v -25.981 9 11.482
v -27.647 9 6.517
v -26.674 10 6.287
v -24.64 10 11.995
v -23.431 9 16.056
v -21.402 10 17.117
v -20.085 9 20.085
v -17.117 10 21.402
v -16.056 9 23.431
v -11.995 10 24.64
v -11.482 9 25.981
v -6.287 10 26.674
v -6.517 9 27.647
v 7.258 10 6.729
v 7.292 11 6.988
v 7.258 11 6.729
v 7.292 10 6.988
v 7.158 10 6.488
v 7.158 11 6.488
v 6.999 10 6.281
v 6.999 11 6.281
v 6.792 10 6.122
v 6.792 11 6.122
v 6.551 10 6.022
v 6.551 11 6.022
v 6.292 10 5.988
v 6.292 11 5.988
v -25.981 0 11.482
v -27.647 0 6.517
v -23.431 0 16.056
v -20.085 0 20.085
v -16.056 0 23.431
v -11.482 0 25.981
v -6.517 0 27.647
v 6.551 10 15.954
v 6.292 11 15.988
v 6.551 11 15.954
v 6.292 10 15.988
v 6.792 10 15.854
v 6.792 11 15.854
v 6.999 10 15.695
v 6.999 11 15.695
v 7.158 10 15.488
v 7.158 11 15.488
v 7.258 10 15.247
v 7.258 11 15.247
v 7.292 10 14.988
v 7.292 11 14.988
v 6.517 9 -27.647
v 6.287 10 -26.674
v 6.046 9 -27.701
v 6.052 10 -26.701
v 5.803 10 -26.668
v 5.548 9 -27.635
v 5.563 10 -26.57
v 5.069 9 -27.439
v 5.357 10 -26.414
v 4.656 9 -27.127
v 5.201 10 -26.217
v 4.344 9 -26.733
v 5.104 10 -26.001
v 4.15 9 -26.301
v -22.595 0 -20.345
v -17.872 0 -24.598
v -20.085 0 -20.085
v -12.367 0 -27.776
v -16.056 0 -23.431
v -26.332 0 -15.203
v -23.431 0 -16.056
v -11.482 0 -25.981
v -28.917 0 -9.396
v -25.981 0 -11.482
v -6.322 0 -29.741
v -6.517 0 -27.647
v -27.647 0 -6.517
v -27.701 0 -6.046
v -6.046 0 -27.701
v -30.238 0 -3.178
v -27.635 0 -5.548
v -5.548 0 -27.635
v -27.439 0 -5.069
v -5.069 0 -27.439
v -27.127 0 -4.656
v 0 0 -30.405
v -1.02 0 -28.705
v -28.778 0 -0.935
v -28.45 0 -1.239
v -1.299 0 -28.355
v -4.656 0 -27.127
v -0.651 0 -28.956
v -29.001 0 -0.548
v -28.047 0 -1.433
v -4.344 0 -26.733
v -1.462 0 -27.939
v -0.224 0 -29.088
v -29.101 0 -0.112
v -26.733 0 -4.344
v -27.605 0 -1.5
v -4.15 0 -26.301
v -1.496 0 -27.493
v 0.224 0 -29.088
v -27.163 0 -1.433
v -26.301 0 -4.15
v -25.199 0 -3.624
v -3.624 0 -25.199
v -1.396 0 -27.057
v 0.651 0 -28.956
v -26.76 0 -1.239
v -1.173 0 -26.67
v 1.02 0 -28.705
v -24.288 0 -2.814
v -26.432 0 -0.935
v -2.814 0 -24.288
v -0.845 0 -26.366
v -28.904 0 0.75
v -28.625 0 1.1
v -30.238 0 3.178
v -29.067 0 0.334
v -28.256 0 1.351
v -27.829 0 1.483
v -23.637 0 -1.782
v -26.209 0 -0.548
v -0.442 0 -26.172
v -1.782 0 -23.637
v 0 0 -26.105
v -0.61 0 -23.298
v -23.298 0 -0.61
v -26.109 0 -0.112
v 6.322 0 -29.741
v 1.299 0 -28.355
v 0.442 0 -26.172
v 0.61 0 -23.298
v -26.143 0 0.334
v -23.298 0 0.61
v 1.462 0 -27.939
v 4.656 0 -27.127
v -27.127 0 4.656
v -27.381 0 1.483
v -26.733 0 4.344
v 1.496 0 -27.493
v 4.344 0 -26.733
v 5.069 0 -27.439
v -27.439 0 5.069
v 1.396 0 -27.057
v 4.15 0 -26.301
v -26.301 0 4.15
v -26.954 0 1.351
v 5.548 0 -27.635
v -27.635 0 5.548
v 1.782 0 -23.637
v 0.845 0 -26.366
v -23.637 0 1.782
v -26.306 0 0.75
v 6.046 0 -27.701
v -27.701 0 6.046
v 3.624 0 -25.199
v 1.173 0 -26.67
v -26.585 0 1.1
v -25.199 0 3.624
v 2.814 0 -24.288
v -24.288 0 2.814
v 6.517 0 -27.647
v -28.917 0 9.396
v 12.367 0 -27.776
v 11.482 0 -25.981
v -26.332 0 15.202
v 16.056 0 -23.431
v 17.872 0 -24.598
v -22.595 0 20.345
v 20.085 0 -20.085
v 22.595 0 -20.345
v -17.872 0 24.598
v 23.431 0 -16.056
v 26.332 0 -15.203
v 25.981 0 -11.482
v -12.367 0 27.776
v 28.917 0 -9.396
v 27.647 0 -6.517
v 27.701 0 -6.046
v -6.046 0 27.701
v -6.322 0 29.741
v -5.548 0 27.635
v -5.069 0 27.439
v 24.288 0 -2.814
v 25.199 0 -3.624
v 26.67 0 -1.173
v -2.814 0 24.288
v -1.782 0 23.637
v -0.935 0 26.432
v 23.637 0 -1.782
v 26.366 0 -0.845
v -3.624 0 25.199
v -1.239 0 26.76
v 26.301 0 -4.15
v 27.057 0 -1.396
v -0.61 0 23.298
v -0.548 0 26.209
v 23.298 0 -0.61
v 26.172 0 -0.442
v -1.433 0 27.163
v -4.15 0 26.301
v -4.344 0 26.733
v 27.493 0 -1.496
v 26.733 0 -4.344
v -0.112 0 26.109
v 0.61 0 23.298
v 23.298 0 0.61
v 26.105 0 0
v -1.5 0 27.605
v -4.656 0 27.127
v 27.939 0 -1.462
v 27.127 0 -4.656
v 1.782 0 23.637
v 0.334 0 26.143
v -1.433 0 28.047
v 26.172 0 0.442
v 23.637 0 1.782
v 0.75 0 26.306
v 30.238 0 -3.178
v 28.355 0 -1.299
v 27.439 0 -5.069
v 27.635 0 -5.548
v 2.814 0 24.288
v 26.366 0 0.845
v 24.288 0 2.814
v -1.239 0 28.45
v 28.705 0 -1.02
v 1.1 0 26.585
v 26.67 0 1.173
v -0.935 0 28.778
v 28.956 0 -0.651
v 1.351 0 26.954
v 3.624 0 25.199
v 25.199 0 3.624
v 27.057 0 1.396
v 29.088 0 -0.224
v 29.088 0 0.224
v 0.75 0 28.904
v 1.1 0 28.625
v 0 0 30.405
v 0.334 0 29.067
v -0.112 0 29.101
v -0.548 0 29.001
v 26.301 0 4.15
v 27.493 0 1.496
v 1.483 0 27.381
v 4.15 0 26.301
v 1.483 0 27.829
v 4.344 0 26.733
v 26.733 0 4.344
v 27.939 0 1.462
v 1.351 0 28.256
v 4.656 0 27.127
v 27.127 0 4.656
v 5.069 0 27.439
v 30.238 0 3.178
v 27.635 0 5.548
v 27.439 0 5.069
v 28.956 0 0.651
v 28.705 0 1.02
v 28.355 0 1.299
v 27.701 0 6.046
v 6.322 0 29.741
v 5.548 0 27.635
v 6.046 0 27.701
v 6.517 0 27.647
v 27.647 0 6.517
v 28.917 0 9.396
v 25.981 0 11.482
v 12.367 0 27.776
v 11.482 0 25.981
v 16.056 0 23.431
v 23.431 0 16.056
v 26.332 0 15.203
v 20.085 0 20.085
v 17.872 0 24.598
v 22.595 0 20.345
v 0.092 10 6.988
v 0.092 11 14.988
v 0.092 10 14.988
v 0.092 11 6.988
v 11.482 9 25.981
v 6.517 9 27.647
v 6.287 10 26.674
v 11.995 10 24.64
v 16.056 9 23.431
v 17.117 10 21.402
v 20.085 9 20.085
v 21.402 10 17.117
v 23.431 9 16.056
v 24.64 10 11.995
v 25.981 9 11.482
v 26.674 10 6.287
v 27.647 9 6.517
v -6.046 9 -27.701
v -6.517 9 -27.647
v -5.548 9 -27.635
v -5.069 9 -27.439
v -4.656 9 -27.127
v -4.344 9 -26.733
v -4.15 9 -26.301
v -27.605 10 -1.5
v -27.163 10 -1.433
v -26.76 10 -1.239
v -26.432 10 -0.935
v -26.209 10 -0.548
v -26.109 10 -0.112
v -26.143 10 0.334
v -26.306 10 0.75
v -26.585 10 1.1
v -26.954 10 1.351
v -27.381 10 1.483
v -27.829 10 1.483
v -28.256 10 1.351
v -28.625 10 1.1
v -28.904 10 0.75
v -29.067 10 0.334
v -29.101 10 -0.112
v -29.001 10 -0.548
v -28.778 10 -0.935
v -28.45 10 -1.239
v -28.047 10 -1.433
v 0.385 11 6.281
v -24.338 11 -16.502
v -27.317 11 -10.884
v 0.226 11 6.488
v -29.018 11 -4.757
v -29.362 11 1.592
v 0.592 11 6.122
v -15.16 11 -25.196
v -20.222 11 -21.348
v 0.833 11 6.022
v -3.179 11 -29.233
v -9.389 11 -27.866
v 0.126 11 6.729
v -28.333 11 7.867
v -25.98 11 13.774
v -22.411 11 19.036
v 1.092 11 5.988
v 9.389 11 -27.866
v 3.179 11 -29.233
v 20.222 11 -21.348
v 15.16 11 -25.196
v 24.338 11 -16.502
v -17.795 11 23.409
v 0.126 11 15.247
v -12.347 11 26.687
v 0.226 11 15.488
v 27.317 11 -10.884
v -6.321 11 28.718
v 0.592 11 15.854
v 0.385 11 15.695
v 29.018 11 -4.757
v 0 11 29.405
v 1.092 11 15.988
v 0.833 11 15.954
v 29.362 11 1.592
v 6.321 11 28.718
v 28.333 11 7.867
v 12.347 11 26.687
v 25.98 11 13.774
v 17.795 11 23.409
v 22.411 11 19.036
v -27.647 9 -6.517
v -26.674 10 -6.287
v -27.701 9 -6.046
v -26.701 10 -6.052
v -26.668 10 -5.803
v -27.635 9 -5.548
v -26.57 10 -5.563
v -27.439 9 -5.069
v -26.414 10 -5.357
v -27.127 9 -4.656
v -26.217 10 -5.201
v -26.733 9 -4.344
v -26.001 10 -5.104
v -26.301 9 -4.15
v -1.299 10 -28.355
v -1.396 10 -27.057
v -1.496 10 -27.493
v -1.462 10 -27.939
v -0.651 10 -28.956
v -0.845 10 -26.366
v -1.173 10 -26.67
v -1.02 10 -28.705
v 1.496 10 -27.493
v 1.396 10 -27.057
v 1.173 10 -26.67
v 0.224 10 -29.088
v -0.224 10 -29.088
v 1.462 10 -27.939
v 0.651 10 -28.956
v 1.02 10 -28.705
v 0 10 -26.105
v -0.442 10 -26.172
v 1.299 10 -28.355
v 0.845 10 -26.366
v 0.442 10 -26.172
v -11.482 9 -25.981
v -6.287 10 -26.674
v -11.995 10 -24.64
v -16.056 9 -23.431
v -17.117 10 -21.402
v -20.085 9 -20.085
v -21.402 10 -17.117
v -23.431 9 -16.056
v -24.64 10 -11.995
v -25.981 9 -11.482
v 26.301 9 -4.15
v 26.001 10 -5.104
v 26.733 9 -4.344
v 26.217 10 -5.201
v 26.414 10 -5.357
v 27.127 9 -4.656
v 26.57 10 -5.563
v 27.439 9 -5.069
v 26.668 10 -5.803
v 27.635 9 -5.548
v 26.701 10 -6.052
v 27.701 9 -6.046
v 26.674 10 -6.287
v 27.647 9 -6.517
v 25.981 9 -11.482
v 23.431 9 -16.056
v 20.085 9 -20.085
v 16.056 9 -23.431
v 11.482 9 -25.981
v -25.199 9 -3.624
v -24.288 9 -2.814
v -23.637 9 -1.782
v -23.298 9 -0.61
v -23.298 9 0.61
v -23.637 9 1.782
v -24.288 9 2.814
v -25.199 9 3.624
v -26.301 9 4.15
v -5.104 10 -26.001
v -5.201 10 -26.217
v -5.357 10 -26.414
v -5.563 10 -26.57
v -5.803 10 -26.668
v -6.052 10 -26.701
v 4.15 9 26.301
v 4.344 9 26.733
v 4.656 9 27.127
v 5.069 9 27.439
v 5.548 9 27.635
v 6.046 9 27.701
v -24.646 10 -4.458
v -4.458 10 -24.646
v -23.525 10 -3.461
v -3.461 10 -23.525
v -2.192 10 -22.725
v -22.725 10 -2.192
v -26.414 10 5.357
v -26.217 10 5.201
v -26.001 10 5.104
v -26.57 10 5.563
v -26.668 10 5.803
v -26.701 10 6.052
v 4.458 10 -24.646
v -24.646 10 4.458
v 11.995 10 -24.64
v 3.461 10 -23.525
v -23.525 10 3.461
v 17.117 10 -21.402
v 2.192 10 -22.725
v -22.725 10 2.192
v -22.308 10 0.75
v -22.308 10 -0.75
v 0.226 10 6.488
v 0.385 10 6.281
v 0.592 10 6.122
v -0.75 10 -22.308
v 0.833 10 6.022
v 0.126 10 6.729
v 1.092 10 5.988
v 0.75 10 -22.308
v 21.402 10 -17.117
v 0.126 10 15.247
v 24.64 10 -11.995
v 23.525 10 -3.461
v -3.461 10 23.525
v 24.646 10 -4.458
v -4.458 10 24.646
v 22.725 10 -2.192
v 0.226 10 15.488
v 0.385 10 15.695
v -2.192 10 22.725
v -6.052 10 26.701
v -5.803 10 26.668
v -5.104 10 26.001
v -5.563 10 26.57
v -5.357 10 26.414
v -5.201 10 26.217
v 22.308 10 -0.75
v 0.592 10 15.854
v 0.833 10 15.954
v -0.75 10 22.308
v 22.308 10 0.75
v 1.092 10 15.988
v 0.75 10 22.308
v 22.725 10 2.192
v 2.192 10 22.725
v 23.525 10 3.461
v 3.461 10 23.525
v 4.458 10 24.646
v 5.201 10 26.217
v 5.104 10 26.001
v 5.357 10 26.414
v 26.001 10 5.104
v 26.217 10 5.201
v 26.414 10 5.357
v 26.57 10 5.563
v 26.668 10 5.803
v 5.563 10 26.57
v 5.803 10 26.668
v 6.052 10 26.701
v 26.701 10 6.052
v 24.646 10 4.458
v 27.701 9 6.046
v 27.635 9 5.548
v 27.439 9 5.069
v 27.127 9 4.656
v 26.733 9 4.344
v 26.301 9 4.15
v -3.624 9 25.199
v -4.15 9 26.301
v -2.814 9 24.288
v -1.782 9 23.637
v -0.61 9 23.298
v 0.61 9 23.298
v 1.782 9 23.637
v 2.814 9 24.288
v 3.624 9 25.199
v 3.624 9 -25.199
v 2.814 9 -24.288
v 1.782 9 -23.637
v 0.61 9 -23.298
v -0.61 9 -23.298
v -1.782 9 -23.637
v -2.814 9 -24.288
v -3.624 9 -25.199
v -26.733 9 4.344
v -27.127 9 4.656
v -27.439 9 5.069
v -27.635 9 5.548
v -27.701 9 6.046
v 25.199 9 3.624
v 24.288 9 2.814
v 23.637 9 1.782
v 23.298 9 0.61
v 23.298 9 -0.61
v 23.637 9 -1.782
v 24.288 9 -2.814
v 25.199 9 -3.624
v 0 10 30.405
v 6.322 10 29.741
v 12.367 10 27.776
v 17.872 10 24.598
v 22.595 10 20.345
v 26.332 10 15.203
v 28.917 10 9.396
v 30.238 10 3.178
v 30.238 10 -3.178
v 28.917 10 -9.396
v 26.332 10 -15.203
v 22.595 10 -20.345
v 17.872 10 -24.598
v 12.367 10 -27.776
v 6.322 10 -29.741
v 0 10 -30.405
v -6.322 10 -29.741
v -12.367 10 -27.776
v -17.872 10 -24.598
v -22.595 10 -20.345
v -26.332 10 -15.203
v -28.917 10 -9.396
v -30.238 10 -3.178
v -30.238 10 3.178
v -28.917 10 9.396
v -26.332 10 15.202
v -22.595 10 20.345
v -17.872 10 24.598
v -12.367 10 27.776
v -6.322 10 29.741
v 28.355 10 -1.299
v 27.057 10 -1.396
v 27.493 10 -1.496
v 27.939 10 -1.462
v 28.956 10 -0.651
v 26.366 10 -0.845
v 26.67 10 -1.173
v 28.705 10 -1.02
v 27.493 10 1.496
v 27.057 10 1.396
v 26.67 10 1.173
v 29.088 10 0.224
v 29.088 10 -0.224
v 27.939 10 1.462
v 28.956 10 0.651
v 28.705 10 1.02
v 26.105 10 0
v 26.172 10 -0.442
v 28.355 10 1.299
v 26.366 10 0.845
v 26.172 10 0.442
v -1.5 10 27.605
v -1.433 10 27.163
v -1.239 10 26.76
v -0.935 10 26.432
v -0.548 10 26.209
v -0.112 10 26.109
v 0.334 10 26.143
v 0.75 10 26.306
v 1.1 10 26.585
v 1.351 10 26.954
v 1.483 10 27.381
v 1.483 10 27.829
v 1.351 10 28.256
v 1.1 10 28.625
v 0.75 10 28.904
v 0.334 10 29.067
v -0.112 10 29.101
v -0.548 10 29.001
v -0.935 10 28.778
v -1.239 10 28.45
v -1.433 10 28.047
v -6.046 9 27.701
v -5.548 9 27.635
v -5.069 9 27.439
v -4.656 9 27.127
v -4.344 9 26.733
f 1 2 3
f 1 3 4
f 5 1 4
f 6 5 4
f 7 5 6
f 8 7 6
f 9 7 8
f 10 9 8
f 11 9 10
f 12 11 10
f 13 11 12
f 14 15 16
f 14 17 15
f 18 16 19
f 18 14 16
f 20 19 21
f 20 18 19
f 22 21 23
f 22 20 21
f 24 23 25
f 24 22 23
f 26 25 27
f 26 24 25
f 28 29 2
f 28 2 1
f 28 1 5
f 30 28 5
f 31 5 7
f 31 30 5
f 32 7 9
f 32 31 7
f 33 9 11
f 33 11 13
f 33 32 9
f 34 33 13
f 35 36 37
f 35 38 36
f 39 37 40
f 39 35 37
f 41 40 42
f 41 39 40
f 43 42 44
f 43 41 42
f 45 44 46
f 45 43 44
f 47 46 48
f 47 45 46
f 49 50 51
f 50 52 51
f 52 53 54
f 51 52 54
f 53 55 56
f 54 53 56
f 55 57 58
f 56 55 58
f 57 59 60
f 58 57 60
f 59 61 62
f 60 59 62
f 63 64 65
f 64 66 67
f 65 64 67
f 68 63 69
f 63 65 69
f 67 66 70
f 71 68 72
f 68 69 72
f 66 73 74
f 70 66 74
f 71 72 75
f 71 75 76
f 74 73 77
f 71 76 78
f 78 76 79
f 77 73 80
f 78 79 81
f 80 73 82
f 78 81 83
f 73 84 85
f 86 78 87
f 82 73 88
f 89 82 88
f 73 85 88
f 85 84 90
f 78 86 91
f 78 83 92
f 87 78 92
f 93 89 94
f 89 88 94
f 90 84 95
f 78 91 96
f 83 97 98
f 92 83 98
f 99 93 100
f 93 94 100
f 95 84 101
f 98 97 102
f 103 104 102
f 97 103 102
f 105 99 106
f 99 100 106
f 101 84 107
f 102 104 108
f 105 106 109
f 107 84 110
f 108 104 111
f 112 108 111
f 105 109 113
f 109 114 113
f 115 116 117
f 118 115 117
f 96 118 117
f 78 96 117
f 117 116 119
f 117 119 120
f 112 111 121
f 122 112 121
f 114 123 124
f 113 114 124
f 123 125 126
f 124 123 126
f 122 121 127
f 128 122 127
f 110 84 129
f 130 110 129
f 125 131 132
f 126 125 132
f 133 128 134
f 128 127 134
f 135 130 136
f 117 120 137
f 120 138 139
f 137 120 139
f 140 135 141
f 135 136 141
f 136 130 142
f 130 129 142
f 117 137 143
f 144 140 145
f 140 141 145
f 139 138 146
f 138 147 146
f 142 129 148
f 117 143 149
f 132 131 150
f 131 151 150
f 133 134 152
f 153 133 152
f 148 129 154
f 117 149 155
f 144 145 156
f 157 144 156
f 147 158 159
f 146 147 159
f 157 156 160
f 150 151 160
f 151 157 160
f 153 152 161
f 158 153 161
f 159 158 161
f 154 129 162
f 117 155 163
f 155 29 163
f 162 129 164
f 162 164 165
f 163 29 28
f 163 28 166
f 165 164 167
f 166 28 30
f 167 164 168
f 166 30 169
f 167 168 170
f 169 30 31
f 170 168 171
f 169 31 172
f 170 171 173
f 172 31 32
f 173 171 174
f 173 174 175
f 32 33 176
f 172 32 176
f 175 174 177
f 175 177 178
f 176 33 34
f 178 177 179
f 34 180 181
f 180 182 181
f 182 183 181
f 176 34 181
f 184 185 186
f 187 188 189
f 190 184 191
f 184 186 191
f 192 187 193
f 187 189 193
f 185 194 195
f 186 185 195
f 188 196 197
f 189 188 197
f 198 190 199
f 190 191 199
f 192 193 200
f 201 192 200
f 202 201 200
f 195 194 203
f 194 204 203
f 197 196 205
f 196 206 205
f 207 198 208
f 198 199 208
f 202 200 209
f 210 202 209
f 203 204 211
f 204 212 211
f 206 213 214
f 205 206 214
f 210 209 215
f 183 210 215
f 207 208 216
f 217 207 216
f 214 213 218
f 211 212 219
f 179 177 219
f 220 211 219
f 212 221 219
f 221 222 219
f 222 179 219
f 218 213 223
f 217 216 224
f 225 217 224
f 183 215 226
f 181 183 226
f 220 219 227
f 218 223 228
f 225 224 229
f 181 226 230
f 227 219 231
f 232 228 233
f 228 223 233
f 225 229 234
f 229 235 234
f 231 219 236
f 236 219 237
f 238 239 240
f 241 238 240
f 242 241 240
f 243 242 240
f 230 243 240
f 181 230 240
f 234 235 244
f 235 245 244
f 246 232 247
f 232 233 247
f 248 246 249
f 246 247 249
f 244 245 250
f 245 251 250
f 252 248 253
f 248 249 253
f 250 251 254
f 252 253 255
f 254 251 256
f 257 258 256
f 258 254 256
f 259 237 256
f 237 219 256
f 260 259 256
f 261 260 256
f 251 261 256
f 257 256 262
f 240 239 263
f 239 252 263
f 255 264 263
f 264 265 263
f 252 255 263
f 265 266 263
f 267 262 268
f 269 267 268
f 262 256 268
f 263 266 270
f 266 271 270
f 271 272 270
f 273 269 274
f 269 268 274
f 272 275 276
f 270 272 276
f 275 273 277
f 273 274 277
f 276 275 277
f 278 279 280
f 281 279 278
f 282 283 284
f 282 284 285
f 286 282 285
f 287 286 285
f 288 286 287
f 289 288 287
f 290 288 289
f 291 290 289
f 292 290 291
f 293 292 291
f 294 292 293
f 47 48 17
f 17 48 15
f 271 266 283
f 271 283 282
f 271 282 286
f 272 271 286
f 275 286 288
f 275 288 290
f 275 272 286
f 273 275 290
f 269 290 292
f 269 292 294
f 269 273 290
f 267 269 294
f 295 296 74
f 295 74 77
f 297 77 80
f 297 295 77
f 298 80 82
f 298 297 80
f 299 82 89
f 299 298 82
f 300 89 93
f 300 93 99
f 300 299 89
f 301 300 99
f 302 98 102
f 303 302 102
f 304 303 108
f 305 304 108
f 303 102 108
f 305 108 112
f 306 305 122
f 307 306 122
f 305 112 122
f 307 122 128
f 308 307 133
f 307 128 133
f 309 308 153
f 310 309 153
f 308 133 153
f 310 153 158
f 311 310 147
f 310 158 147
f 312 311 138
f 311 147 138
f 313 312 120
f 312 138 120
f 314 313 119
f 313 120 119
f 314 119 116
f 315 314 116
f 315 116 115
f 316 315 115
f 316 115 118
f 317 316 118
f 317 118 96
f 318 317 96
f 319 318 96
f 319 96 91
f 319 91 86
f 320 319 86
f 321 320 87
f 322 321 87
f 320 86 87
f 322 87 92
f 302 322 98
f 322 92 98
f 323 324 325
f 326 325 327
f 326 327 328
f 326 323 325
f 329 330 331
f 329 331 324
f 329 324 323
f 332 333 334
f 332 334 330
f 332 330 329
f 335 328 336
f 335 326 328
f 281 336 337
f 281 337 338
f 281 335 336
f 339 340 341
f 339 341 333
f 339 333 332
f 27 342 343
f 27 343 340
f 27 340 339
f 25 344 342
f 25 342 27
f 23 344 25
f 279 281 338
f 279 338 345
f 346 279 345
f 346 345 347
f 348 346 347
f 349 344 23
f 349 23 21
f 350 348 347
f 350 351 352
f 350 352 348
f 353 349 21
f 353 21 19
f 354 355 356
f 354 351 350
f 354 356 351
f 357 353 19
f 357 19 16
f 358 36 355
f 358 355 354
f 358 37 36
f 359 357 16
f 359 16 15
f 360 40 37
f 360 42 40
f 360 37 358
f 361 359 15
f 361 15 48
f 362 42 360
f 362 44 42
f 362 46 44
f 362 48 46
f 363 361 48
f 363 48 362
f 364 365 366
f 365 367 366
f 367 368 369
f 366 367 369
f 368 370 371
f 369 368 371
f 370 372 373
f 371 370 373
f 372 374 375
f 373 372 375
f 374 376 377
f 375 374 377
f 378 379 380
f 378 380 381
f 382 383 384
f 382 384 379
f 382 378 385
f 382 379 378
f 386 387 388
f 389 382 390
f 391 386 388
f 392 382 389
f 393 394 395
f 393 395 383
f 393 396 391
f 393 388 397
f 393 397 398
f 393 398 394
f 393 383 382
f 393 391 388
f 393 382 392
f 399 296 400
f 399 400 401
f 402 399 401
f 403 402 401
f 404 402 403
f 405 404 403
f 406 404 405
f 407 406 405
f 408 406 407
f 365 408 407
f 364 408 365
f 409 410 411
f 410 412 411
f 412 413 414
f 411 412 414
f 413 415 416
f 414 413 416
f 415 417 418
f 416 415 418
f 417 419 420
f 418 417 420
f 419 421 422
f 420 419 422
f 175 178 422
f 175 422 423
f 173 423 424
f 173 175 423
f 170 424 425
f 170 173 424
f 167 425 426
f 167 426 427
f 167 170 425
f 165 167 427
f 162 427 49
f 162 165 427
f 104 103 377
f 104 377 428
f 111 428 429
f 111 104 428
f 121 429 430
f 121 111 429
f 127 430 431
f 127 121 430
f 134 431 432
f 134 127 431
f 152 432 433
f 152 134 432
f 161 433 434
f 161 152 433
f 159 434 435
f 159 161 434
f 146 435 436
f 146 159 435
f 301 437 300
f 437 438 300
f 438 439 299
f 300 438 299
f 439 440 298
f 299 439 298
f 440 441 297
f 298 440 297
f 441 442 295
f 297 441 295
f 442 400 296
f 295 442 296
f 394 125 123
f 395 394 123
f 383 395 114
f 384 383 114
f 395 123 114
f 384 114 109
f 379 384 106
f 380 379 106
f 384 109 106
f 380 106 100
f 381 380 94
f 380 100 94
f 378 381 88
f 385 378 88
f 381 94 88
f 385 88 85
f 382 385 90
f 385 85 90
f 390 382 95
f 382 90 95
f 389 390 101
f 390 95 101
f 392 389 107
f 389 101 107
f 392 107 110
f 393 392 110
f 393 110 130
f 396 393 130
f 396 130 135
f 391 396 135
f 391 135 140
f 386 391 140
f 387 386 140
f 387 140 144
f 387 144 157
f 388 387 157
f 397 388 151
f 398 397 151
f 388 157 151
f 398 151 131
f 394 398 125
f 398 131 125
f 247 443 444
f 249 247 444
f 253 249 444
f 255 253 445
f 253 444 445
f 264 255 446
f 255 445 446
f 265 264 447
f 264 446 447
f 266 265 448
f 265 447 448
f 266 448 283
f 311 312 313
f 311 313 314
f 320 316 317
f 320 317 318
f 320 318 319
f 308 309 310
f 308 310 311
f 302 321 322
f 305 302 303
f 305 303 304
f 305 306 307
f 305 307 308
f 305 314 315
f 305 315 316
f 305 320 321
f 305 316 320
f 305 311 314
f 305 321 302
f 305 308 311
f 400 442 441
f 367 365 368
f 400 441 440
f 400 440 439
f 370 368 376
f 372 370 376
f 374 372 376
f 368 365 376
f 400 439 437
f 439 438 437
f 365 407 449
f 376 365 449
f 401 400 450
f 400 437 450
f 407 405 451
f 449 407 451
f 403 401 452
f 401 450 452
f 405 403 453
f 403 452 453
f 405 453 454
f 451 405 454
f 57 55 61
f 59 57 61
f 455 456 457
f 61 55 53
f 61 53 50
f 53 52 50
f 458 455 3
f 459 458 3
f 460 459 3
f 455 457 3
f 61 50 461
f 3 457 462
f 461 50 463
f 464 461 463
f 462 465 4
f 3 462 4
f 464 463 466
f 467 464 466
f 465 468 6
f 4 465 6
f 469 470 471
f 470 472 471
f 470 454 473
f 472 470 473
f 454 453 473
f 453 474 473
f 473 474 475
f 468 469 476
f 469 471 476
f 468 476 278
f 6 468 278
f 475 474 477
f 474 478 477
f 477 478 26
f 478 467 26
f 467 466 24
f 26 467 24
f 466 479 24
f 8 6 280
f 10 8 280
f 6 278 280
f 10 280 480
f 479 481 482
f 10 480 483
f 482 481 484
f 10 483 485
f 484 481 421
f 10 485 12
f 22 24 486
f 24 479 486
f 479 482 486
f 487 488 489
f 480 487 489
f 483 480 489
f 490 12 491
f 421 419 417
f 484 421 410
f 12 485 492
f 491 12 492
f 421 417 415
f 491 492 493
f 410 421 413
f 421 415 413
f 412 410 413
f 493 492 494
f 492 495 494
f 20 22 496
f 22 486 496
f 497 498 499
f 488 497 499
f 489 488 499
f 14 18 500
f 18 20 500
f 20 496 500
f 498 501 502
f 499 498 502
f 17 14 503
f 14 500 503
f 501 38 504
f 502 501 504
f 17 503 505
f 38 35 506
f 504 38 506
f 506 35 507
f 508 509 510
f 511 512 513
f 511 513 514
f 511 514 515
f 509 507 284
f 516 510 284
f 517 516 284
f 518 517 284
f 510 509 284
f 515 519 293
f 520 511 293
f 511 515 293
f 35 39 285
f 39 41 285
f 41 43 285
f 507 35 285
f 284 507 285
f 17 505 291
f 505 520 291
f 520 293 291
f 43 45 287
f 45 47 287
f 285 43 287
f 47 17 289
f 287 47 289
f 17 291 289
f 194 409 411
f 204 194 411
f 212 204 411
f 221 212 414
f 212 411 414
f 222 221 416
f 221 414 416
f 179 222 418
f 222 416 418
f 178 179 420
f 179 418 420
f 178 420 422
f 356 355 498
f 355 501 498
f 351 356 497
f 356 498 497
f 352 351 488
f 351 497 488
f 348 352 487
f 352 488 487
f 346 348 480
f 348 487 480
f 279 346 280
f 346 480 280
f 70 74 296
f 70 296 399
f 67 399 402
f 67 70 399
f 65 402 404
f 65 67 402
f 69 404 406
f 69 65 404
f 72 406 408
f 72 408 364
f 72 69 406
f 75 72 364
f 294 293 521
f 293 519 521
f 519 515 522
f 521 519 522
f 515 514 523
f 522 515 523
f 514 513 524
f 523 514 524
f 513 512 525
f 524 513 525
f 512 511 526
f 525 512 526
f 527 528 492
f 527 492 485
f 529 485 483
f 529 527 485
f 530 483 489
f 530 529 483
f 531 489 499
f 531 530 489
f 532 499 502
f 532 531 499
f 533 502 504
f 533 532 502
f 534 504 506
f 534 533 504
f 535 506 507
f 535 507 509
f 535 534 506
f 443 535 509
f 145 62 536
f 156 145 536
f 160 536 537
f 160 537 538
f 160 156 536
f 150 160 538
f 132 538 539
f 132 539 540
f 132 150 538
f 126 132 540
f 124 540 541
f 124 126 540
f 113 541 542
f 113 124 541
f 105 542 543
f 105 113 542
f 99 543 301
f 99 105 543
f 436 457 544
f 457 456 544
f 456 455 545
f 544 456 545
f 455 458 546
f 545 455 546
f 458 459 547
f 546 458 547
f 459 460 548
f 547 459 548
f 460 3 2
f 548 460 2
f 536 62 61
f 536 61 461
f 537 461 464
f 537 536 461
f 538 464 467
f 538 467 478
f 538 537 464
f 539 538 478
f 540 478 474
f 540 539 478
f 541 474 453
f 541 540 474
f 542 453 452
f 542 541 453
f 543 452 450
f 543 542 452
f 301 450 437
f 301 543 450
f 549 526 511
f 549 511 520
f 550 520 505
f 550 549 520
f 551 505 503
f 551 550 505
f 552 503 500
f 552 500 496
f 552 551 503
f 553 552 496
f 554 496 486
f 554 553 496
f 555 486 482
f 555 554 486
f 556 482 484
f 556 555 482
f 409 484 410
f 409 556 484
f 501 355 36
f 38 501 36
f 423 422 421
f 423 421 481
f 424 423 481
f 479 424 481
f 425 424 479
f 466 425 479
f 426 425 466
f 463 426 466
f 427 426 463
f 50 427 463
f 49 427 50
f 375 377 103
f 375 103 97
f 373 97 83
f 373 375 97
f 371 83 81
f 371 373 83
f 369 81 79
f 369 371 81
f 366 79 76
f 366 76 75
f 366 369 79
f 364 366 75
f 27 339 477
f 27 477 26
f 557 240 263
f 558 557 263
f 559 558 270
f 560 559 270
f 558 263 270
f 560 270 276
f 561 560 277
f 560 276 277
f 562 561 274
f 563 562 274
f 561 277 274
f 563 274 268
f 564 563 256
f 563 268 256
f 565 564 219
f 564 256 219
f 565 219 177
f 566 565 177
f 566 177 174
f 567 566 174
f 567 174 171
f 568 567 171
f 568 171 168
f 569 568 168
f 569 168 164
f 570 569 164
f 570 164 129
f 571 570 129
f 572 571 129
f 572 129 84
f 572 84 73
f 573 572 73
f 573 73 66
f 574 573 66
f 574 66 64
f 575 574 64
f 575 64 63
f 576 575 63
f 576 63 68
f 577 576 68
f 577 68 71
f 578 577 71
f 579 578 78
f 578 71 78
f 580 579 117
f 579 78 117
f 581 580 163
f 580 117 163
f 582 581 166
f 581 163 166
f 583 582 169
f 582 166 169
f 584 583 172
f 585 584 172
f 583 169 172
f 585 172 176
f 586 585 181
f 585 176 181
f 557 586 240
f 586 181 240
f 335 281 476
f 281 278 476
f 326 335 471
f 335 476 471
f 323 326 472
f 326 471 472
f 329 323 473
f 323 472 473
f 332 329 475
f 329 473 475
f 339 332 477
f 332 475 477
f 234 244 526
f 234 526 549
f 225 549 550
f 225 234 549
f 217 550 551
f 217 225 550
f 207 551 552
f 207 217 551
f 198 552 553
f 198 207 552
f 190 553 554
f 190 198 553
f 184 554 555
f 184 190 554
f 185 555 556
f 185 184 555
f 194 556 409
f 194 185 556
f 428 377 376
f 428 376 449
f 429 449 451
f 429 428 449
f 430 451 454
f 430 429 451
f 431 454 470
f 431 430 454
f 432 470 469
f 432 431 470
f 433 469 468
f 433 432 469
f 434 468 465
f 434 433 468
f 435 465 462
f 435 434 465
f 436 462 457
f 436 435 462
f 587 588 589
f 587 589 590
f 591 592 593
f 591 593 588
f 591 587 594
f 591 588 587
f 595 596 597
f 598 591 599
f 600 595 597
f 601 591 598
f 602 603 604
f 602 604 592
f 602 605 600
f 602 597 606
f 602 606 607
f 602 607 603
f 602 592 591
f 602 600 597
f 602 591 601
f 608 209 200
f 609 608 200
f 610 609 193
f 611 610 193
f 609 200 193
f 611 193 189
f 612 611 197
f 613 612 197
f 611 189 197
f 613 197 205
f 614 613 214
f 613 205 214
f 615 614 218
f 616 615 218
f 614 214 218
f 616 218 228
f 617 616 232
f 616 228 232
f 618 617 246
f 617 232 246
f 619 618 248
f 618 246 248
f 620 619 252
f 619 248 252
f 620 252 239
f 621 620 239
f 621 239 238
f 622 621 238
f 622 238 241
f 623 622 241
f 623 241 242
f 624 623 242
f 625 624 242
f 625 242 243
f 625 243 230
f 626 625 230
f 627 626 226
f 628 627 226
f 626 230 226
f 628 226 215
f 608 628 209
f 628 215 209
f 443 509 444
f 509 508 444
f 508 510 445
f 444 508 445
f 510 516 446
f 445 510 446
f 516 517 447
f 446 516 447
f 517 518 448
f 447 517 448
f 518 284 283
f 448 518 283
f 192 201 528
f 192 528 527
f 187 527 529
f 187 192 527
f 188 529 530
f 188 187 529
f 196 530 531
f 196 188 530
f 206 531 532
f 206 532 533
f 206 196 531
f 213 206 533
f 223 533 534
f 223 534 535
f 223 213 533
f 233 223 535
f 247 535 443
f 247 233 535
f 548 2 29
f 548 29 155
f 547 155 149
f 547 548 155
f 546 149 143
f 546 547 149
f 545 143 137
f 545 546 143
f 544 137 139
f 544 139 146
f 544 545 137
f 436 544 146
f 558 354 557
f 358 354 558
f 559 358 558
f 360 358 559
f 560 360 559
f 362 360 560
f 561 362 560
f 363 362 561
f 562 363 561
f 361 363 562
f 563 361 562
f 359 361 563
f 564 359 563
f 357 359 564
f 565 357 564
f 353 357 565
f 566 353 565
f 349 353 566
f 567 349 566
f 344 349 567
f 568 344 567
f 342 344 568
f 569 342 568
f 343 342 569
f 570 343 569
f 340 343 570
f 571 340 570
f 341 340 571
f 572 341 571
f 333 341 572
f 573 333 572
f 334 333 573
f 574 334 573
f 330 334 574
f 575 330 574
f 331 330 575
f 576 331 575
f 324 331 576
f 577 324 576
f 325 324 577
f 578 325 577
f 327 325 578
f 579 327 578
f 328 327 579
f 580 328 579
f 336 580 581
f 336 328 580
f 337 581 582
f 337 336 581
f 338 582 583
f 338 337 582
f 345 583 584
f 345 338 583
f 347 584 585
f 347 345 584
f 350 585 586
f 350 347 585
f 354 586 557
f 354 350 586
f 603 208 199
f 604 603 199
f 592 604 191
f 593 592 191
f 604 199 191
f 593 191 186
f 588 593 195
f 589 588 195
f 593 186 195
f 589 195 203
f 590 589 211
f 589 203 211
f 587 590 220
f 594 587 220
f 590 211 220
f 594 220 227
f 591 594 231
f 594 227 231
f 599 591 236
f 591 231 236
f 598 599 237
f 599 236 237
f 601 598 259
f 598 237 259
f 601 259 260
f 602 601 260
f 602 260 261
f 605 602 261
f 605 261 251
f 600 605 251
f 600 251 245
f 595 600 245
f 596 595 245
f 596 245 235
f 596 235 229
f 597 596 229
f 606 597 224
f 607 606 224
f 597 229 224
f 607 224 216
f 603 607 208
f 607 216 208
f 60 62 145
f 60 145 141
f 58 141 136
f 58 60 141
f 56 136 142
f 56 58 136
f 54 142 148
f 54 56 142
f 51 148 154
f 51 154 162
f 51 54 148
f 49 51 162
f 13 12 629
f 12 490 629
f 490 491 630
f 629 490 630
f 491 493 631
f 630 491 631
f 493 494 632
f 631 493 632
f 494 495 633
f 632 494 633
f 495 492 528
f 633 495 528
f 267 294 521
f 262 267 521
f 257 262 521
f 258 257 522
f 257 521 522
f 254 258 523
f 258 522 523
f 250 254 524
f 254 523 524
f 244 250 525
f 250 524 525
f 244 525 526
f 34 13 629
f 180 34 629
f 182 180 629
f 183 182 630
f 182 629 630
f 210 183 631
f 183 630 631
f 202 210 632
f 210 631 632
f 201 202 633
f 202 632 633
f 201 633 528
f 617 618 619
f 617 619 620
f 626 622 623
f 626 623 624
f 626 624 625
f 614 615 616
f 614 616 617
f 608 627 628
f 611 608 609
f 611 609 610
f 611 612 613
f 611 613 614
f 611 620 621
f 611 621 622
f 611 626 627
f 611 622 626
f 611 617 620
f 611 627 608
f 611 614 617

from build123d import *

# Parameters (mm, degrees)
SKIZZE1_R                       = 30.405
SKIZZE1_R_2                     = 28.405
AUFSATZ_LINEAR_AUSTRAGEN1_DEPTH = 10
SKIZZE2_R                       = 30.405
AUFSATZ_LINEAR_AUSTRAGEN2_DEPTH = 1
AUFSATZ_LINEAR_START            = 10
AUFSATZ_LINEAR_AUSTRAGEN3_DEPTH = 10
SKIZZE5_R                       = 1.5
SCHNITT_LINEAR_AUSTRAGEN2_DEPTH = 10
SKIZZE6_W                       = 7.2
SKIZZE6_H                       = 10
SCHNITT_LINEAR_AUSTRAGEN3_DEPTH = 10
KREISMUSTER1_COUNT              = 2
KREISMUSTER1_ANGLE              = 90
FASE1_SIZE                      = 1
VERRUNDUNG1_R                   = 2
VERRUNDUNG2_R                   = 1
FASE2_SIZE                      = 1


with BuildPart() as part:
    # Skizze1 → Aufsatz-Linear austragen1 (new body)
    with BuildSketch(Plane(origin=(0, 0, 0), x_dir=(1, 0, 0), z_dir=(0, 1, 0))):
        with Locations(Location((0, 0, 0), (0, 0, 270))):
            Circle(SKIZZE1_R)
        with Locations(Location((0, 0, 0), (0, 0, 270))):
            Circle(SKIZZE1_R_2, mode=Mode.SUBTRACT)
    extrude(amount=AUFSATZ_LINEAR_AUSTRAGEN1_DEPTH)

    # Skizze2 → Aufsatz-Linear austragen2 (add)
    with BuildSketch(Plane(origin=(0, 10, 0), x_dir=(1, 0, 0), z_dir=(0, 1, 0))):
        with Locations(Location((0, 0, 0), (0, 0, 270))):
            Circle(SKIZZE2_R)
    extrude(amount=AUFSATZ_LINEAR_AUSTRAGEN2_DEPTH)

    # Skizze4 → Aufsatz-Linear austragen3 (add)
    with BuildSketch(Plane.XZ.offset(-10).offset(AUFSATZ_LINEAR_START)):
        with BuildLine():
            ThreePointArc((-28.07385528, -4.324658914), (-23.255, 0), (-28.07385528, 4.324658914))
            ThreePointArc((-28.07385528, 4.324658914), (-28.405, 0), (-28.07385528, -4.324658914))
        make_face()
        with BuildLine():
            ThreePointArc((28.405, 0), (28.322092827, 2.168659237), (28.07385528, 4.324658914))
            ThreePointArc((28.07385528, 4.324658914), (23.255, 0), (28.07385528, -4.324658914))
            ThreePointArc((28.07385528, -4.324658914), (28.322092827, -2.168659237), (28.405, 0))
        make_face()
    aufsatz_linear_austragen3 = extrude(amount=-AUFSATZ_LINEAR_AUSTRAGEN3_DEPTH)

    # Skizze5 → Schnitt-Linear austragen2 (cut)
    with BuildSketch(Plane.XZ):
        with Locations(Location((-27.605, 0, 0), (0, 0, 270))):
            Circle(SKIZZE5_R)
        with BuildLine():
            ThreePointArc((29.105, 0), (27.605, 1.5), (26.105, 0))
            Line((26.105, 0), (29.105, 0))
        make_face()
        with BuildLine():
            Line((29.105, 0), (26.105, 0))
            ThreePointArc((26.105, 0), (27.605, -1.5), (29.105, 0))
        make_face()
    schnitt_linear_austragen2 = extrude(amount=-SCHNITT_LINEAR_AUSTRAGEN2_DEPTH, mode=Mode.SUBTRACT)

    # Skizze6 → Schnitt-Linear austragen3 (cut)
    with BuildSketch(Plane(origin=(0, 11, 0), x_dir=(1, 0, 0), z_dir=(0, 1, 0))):
        with Locations((3.69194255, -10.988)):
            Rectangle(SKIZZE6_W, SKIZZE6_H)
    extrude(amount=-SCHNITT_LINEAR_AUSTRAGEN3_DEPTH, mode=Mode.SUBTRACT)

    # Kreismuster1: Aufsatz-Linear austragen3, Schnitt-Linear austragen2 ×2 about axis
    kreismuster1_axis = Axis((0, 0, 0), (0, 1, 0))
    add([aufsatz_linear_austragen3.rotate(kreismuster1_axis, i * KREISMUSTER1_ANGLE / (KREISMUSTER1_COUNT - 1)) for i in range(1, KREISMUSTER1_COUNT)])
    add([schnitt_linear_austragen2.rotate(kreismuster1_axis, i * KREISMUSTER1_ANGLE / (KREISMUSTER1_COUNT - 1)) for i in range(1, KREISMUSTER1_COUNT)], mode=Mode.SUBTRACT)

    # Fase1
    fase1_edges = [part.edges().sort_by_distance(p)[0] for p in [
        (0, 11, -30.405),
    ]]
    chamfer(fase1_edges, length=FASE1_SIZE)

    # Verrundung1
    verrundung1_edges = [part.edges().sort_by_distance(p)[0] for p in [
        (-28.07385528, 5, 4.324658914),
        (-28.07385528, 5, -4.324658914),
        (28.07385528, 5, 4.324658914),
        (28.07385528, 5, -4.324658914),
        (4.324658914, 5, 28.07385528),
        (-4.324658914, 5, 28.07385528),
        (4.324658914, 5, -28.07385528),
        (-4.324658914, 5, -28.07385528),
    ]]
    fillet(verrundung1_edges, radius=VERRUNDUNG1_R)

    # Verrundung2
    verrundung2_edges = [part.edges().sort_by_distance(p)[0] for p in [
        (7.29194255, 10.5, 5.988),
        (7.29194255, 10.5, 15.988),
        (0.09194255, 10.5, 15.988),
        (0.09194255, 10.5, 5.988),
    ]]
    fillet(verrundung2_edges, radius=VERRUNDUNG2_R)

    # Fase2
    fase2_edges = [part.edges().sort_by_distance(p)[0] for p in [
        (-20.08536812, 10, -20.08536812),
        (0, 10, -23.255),
        (20.08536812, 10, -20.08536812),
        (23.255, 10, 0),
        (20.08536812, 10, 20.08536812),
        (0, 10, 23.255),
        (-20.08536812, 10, 20.08536812),
        (-23.255, 10, 0),
        (-5.068546935, 10, 27.438977106),
        (5.068546935, 10, 27.438977106),
        (-27.438977106, 10, -5.068546935),
        (-27.438977106, 10, 5.068546935),
        (27.438977106, 10, 5.068546935),
        (27.438977106, 10, -5.068546935),
        (5.068546935, 10, -27.438977106),
        (-5.068546935, 10, -27.438977106),
    ]]
    chamfer(fase2_edges, length=FASE2_SIZE)


solid = part.part
